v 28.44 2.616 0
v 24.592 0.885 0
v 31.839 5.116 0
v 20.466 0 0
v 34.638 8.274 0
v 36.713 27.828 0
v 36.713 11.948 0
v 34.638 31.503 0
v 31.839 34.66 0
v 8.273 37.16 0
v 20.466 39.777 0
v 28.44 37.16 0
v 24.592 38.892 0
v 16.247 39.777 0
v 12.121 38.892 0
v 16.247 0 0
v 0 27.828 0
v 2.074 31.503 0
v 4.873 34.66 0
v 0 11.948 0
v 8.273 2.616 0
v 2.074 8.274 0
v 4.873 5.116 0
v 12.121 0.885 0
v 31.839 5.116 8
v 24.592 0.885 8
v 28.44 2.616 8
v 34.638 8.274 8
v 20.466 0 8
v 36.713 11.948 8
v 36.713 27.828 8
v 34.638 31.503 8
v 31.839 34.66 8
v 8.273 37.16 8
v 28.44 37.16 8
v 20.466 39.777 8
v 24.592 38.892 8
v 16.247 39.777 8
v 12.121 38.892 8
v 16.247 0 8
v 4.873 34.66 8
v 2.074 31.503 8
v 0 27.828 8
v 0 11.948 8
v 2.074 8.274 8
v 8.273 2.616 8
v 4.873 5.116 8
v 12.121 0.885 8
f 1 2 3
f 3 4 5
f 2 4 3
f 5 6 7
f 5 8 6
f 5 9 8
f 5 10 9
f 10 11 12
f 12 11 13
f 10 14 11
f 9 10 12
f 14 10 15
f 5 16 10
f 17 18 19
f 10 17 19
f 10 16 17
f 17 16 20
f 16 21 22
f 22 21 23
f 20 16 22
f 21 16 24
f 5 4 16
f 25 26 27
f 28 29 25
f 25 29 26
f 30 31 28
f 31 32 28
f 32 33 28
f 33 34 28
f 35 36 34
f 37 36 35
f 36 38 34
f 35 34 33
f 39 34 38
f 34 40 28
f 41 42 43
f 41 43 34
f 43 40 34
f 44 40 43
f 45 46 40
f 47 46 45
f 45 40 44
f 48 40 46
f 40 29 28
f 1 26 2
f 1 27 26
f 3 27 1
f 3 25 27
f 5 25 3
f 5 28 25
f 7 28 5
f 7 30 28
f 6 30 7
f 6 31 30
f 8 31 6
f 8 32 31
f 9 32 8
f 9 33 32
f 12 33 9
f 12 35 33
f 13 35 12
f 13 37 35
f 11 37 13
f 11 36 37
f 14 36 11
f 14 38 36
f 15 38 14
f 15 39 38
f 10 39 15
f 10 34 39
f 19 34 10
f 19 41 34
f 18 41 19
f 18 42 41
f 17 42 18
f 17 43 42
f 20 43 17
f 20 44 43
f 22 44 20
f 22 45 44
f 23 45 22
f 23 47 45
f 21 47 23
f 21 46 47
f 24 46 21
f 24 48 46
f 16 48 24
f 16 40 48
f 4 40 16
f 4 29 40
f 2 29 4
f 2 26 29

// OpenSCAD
$fn = 32;

// ----------------------------------------------------------------------
// Flat adaptor: double_d, 8 mm thick
// ----------------------------------------------------------------------

// --- parameters (mm) ---
profile_height = 8;       // extrusion height
profile_points = 24;      // points of the closed outline

profile = [[36.713, 27.828], [34.638, 31.503], [31.839, 34.66], [28.44, 37.16], [24.592, 38.892], [20.466, 39.777], [16.247, 39.777], [12.121, 38.892], [8.273, 37.16], [4.873, 34.66], [2.074, 31.503], [0, 27.828], [0, 11.948], [2.074, 8.274], [4.873, 5.116], [8.273, 2.616], [12.121, 0.885], [16.247, 0], [20.466, 0], [24.592, 0.885], [28.44, 2.616], [31.839, 5.116], [34.638, 8.274], [36.713, 11.948]];  // single closed polygon, 24 points, counter clockwise

// --- the one profile operation ---
linear_extrude(height = profile_height) polygon(points = profile);
